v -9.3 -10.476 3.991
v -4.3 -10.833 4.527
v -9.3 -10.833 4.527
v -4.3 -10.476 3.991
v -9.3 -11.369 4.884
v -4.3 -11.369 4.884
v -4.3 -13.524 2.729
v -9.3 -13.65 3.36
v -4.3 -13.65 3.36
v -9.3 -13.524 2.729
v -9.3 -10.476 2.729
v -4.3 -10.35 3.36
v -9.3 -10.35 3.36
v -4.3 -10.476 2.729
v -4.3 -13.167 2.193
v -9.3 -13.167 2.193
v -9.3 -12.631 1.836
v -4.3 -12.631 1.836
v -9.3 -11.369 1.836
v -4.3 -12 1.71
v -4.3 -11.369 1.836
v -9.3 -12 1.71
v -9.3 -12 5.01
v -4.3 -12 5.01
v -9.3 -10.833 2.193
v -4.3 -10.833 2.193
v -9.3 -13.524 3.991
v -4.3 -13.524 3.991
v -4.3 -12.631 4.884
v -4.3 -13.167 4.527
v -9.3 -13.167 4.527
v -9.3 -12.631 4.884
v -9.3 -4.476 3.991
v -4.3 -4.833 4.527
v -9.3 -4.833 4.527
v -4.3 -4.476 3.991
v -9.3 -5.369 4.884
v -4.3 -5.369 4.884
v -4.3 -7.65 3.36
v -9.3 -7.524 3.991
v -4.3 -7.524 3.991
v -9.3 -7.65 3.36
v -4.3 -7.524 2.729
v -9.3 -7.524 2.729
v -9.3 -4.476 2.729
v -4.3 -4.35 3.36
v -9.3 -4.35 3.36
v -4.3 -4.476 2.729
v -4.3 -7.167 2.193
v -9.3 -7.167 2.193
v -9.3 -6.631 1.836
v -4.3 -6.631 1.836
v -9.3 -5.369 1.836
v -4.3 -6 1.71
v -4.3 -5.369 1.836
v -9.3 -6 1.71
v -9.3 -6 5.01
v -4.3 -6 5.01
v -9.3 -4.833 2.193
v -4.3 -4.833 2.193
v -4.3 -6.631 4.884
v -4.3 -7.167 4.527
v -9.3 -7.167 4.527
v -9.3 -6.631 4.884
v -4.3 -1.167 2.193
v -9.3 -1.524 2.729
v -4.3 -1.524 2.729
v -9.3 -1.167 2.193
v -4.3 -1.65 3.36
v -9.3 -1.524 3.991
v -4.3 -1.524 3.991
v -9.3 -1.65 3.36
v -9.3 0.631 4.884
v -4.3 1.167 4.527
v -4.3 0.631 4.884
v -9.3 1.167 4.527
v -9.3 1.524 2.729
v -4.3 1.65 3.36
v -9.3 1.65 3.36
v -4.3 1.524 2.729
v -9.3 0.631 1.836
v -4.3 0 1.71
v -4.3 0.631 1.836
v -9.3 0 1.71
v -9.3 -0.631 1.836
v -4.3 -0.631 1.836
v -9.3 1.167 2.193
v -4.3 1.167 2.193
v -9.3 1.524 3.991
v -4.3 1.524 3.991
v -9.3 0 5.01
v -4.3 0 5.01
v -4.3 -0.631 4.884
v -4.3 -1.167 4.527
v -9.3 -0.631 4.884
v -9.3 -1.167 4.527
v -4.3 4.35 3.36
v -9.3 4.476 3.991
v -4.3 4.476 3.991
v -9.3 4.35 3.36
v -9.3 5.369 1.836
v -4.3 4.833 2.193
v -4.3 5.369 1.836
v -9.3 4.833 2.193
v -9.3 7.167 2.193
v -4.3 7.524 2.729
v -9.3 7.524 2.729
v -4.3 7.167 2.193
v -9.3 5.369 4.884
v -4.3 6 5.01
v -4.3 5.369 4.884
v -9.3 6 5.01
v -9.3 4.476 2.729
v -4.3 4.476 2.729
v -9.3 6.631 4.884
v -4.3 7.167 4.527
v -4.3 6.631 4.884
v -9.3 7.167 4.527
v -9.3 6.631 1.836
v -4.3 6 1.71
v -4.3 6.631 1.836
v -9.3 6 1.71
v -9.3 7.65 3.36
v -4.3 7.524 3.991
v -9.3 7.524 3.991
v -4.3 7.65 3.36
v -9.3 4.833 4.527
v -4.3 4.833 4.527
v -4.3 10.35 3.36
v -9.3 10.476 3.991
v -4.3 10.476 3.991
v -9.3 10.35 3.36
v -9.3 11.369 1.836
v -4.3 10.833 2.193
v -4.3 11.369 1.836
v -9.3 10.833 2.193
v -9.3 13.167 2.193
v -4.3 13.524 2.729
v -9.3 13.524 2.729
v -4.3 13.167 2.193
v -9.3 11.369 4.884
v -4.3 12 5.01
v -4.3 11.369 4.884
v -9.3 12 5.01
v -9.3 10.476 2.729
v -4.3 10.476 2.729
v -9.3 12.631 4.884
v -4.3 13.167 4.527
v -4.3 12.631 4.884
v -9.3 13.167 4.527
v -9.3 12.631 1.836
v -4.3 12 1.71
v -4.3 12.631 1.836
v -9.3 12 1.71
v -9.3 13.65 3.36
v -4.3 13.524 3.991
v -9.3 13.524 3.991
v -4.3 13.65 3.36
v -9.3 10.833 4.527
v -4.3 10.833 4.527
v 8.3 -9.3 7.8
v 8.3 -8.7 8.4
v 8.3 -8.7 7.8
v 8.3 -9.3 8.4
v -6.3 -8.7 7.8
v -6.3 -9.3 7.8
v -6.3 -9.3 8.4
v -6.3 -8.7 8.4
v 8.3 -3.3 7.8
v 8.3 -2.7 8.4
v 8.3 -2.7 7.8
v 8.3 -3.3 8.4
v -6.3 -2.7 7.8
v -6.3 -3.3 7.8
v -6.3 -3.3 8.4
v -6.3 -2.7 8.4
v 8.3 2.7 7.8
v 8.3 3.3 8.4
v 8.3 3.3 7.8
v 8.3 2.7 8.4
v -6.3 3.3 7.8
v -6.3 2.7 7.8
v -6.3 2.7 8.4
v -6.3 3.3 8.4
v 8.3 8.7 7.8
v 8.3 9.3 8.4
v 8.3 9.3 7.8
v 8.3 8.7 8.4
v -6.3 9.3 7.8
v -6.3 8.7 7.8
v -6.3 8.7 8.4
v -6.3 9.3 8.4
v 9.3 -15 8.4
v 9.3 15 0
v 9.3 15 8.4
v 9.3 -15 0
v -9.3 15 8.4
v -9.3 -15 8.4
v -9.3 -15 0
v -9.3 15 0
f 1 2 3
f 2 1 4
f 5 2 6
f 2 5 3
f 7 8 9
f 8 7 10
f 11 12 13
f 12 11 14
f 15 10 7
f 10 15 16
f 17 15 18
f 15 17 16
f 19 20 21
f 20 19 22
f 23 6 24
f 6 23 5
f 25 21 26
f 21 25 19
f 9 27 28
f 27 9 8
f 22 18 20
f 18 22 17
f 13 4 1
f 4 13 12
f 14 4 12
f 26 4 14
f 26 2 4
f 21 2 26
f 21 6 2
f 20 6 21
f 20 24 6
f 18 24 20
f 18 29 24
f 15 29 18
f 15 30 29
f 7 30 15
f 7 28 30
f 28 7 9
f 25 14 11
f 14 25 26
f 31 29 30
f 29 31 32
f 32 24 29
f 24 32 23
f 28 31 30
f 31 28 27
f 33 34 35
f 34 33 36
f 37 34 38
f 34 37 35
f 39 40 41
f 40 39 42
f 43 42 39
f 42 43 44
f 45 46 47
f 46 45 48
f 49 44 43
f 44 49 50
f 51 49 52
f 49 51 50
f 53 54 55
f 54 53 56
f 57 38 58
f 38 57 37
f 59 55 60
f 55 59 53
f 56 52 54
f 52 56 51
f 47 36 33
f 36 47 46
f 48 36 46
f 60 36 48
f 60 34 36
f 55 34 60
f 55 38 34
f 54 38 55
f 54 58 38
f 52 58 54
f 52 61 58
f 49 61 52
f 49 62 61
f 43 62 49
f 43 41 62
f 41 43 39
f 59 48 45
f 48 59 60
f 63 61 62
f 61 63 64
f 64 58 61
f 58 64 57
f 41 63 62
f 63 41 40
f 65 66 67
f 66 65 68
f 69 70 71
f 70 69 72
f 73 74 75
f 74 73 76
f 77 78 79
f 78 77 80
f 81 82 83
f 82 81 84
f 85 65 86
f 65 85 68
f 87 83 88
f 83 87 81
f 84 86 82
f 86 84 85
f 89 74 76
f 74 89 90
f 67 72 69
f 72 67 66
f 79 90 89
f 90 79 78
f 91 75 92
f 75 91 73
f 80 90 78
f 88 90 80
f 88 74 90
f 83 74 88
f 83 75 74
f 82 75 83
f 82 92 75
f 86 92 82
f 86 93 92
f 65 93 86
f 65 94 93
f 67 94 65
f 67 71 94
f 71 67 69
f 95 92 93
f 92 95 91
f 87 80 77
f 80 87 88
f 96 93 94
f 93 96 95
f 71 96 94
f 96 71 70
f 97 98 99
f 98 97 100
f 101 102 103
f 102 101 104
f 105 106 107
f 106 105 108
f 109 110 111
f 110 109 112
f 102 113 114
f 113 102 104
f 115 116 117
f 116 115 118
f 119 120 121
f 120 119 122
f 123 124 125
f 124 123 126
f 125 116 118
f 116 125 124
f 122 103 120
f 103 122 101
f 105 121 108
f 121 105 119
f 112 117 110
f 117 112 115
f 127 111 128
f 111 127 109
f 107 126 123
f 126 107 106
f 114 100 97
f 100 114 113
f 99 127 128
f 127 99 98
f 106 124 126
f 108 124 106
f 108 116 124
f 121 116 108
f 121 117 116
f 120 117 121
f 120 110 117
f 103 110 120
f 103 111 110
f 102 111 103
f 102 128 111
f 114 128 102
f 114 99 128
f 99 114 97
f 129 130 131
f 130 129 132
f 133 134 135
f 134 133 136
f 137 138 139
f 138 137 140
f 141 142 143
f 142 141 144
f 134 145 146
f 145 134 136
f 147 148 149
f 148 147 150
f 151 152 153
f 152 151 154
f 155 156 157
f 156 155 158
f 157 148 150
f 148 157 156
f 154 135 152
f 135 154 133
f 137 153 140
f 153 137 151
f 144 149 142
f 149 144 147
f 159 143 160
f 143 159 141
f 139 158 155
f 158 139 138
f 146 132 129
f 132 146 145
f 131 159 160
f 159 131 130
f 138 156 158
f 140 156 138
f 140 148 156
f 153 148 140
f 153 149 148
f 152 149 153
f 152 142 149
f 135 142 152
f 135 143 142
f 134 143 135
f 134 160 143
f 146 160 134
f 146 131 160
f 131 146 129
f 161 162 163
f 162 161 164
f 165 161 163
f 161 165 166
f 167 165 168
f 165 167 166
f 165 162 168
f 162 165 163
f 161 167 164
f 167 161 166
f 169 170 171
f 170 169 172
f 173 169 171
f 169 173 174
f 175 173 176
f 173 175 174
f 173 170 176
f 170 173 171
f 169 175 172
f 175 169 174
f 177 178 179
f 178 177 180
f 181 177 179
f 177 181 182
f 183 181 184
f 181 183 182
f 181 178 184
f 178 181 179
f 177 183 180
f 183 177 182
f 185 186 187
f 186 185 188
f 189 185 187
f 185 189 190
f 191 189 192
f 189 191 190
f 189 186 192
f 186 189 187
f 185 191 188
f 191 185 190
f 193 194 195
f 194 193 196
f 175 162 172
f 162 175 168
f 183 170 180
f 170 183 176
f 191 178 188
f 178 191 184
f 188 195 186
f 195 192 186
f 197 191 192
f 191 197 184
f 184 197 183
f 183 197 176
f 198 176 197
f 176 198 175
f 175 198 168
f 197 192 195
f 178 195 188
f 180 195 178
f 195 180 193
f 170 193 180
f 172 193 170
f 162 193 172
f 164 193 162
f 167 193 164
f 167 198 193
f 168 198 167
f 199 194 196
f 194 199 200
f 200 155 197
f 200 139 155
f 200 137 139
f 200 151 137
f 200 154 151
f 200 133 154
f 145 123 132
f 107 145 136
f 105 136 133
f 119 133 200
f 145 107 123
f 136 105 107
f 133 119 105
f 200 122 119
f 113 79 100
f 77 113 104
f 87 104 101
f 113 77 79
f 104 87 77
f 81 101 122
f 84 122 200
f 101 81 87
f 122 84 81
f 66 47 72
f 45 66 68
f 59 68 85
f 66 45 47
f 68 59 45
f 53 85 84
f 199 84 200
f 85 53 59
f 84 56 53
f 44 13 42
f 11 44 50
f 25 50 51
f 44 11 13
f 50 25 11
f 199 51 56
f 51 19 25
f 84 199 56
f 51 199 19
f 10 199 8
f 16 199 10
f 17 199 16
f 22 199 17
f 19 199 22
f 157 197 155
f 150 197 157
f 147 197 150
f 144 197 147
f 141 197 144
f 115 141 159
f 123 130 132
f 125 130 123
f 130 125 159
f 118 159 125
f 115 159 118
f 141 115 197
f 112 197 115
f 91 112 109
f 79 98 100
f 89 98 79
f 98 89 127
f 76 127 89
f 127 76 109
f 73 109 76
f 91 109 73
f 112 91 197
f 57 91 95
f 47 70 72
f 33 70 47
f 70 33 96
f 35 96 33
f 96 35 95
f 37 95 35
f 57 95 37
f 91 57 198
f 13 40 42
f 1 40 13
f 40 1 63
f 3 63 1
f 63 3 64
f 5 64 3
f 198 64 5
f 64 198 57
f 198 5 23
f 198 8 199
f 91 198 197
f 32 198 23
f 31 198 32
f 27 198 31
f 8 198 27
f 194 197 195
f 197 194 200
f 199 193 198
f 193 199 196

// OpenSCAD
// file: ../wago-221.scad
//-----------------------------------------------------------------------
// WAGO 221 lever connector, held in a snap clip on the floor
//
// Push it down between two arms: the WAGO presses on the sloped lead-ins,
// the arms flex outward, and their hooks snap over its top edge at each
// short end. L-shaped corner stops locate the footprint. The wire-entry face
// is left open, with only a short stub at each corner so the outer ports
// stay clear. Lift the hooks with a fingernail to take it out.
//
// Three modules, all in the same frame:
//   wagoGhost()   the connector, for previews
//   wagoClip()    the plastic: two arms with hooks and four corner stops
//   wagoBody()    the connector as a plain solid (views, collision checks)
//
// Frame: origin on the floor top, at the centre of the WAGO's footprint.
// +X from the wire-entry face to the back (entries face -X), Y along the row
// of levers (the short ends at +-Y), Z up. Units: mm.
//
// Sizes: "221-412", "221-413", "221-415" (4 mm², 2/3/5 way), "221-425" (same
// body as the 415), "221-612", "221-613", "221-615" (6 mm²). Select by name;
// wagoSize(name) gives the row of wagoSizes.
//
// Use with `use <.../components/wago-221/wago-221.scad>`.
//-----------------------------------------------------------------------

//-- [name, length (Y), depth (X), height levers closed, ports, strip length, max mm²]
//-- WAGO data sheets unless noted; see the README for each source
wagoSizes = [
  ["221-412", 13.2, 18.8, 8.6, 2, 11, 4],     // data sheet 03.10.2022 (brochure: 13.1 x 18.6 x 8.3)
  ["221-413", 18.7, 18.6, 8.3, 3, 11, 4],     // WAGO UK brochure, no data sheet found: CAL
  ["221-415", 30.0, 18.6, 8.4, 5, 11, 4],     // data sheet 19.04.2025; measured on a 221-425, controller project
  ["221-425", 30.0, 18.6, 8.4, 5, 11, 4],     // Green Range 415: measured 2026-10 (the controller project's base)
  ["221-612", 16.0, 21.1, 10.1, 2, 13, 6],    // data sheet 12.05.2023 (strip 12-14)
  ["221-613", 22.9, 21.1, 10.1, 3, 13, 6],    // data sheet 04.04.2025
  ["221-615", 36.7, 21.1, 10.1, 5, 13, 6],    // data sheet 07.04.2025
];

function wagoSize(name) = let (i = search([name], wagoSizes)[0])
  assert(i != [] && i != undef, str("unknown WAGO ", name)) wagoSizes[i];
function wagoLength(name) = wagoSize(name)[1];
function wagoDepth(name)  = wagoSize(name)[2];
function wagoHeight(name) = wagoSize(name)[3];
function wagoPorts(name)  = wagoSize(name)[4];
function wagoStrip(name)  = wagoSize(name)[5];

wagoDefault    = "221-415";

//-- The clip
wagoClearance  = 0.4;     // each end and side, footprint to arm / stop (controller base fitClearance)
wagoHook       = 0.7;     // CAL: how far each hook reaches in over the WAGO's top edge. Set by the fit piece
wagoHookGap    = 0.2;     // WAGO top to the hook's flat underside
wagoLeadIn     = 1.4;     // height of the sloped lead-in above the hook
wagoArmThick   = 1.6;     // PETG arm (controller base); flexes outward by the hook to let the WAGO in
wagoArmWidth   = 8;       // across X, centred on the depth
wagoStopH      = 3;       // corner stops, above the floor
wagoStopLeg    = 4;       // stop legs along the ends and the back
wagoStopWall   = 1.6;
wagoEntryStub  = 1.0;     // stop leg along the entry face: short, clear of the outer port

//-- height of the clip above the floor: room needed under a lid (the levers open to
//-- about 20 above the floor, CAL; you only open them with the WAGO out of the clip)
function wagoClipHeight(name = wagoDefault) = wagoHeight(name) + wagoHookGap + wagoLeadIn;

module wagoBody(name = wagoDefault)
{
  translate([-wagoDepth(name)/2, -wagoLength(name)/2, 0])
    cube([wagoDepth(name), wagoLength(name), wagoHeight(name)]);
}

module wagoGhost(name = wagoDefault)
{
  L = wagoLength(name); D = wagoDepth(name); H = wagoHeight(name); n = wagoPorts(name);
  %color("Orange") difference()
  {
    wagoBody(name);
    //-- a conductor entry per port, on the -X face
    for (i = [0 : n - 1])
      translate([-D/2 - 1, (i - (n - 1)/2)*L/n, H*0.4]) rotate([0, 90, 0]) cylinder(d = L/n*0.55, h = 6, $fn = 16);
  }
}

module wagoClip(name = wagoDefault, clearance = wagoClearance, hook = wagoHook)
{
  L = wagoLength(name); D = wagoDepth(name);
  c = clearance;
  H = wagoHeight(name) + wagoHookGap;           // hook underside
  t = wagoArmThick;
  reach = c + hook;                             // hook tip past the arm's inner face
  leg = min(wagoStopLeg, D/2 - wagoArmWidth/2 - 0.8);   // stays clear of the arm, so it flexes
  assert(leg >= 1.5, "WAGO too shallow for the corner stops beside the arms");

  //-- arms: inner face at L/2 + c, hook toward the WAGO, free from the floor so they flex
  for (m = [0, 1])
    mirror([0, m, 0])
      translate([-wagoArmWidth/2, L/2 + c, -0.01])
        rotate([90, 0, 90]) linear_extrude(wagoArmWidth)
          polygon([[0, 0], [t, 0], [t, H + 0.01 + wagoLeadIn], [0, H + 0.01 + wagoLeadIn],
                   [-reach, H + 0.01], [0, H + 0.01]]);
  //-- corner stops, outside the footprint: a leg along each end, one along the back,
  //-- and a short stub along the entry face
  for (sx = [-1, 1], sy = [-1, 1])
    translate([sx*(D/2 + c), sy*(L/2 + c), -0.01])
      mirror([sx < 0 ? 1 : 0, 0, 0]) mirror([0, sy < 0 ? 1 : 0, 0])
      {
        //-- along the end (Y face): from the corner inward in -X
        translate([-leg, 0, 0]) cube([leg + wagoStopWall, wagoStopWall, wagoStopH + 0.01]);
        //-- along the side (X face): from the corner inward in -Y
        sideLeg = sx < 0 ? wagoEntryStub : leg;
        translate([0, -sideLeg, 0]) cube([wagoStopWall, sideLeg + wagoStopWall, wagoStopH + 0.01]);
      }
}
// main file
// The WAGO as a solid, for the catalogue (the Ghost is % so it never renders).
// n of them at the fit piece's pitch, so it sits in each clip.
use <../wago-221.scad>

name = "221-415";
n    = 1;
D = wagoDepth(name); L = wagoLength(name); H = wagoHeight(name); p = wagoPorts(name);
pitch = D + 2*(0.4 + 1.6) + 3;

for (i = [0 : n - 1])
  translate([i*pitch, 0, 0])
    difference()
    {
      wagoBody(name);
      //-- conductor entries on the -X face, and the lever split lines on top
      for (j = [0 : p - 1])
        translate([-D/2 - 1, (j - (p - 1)/2)*L/p, H*0.4]) rotate([0, 90, 0]) cylinder(d = L/p*0.55, h = 6, $fn = 16);
      for (j = [1 : p - 1])
        translate([-D/2 + 3, (j - p/2)*L/p - 0.3, H - 0.6]) cube([D - 4, 0.6, 1]);
    }
